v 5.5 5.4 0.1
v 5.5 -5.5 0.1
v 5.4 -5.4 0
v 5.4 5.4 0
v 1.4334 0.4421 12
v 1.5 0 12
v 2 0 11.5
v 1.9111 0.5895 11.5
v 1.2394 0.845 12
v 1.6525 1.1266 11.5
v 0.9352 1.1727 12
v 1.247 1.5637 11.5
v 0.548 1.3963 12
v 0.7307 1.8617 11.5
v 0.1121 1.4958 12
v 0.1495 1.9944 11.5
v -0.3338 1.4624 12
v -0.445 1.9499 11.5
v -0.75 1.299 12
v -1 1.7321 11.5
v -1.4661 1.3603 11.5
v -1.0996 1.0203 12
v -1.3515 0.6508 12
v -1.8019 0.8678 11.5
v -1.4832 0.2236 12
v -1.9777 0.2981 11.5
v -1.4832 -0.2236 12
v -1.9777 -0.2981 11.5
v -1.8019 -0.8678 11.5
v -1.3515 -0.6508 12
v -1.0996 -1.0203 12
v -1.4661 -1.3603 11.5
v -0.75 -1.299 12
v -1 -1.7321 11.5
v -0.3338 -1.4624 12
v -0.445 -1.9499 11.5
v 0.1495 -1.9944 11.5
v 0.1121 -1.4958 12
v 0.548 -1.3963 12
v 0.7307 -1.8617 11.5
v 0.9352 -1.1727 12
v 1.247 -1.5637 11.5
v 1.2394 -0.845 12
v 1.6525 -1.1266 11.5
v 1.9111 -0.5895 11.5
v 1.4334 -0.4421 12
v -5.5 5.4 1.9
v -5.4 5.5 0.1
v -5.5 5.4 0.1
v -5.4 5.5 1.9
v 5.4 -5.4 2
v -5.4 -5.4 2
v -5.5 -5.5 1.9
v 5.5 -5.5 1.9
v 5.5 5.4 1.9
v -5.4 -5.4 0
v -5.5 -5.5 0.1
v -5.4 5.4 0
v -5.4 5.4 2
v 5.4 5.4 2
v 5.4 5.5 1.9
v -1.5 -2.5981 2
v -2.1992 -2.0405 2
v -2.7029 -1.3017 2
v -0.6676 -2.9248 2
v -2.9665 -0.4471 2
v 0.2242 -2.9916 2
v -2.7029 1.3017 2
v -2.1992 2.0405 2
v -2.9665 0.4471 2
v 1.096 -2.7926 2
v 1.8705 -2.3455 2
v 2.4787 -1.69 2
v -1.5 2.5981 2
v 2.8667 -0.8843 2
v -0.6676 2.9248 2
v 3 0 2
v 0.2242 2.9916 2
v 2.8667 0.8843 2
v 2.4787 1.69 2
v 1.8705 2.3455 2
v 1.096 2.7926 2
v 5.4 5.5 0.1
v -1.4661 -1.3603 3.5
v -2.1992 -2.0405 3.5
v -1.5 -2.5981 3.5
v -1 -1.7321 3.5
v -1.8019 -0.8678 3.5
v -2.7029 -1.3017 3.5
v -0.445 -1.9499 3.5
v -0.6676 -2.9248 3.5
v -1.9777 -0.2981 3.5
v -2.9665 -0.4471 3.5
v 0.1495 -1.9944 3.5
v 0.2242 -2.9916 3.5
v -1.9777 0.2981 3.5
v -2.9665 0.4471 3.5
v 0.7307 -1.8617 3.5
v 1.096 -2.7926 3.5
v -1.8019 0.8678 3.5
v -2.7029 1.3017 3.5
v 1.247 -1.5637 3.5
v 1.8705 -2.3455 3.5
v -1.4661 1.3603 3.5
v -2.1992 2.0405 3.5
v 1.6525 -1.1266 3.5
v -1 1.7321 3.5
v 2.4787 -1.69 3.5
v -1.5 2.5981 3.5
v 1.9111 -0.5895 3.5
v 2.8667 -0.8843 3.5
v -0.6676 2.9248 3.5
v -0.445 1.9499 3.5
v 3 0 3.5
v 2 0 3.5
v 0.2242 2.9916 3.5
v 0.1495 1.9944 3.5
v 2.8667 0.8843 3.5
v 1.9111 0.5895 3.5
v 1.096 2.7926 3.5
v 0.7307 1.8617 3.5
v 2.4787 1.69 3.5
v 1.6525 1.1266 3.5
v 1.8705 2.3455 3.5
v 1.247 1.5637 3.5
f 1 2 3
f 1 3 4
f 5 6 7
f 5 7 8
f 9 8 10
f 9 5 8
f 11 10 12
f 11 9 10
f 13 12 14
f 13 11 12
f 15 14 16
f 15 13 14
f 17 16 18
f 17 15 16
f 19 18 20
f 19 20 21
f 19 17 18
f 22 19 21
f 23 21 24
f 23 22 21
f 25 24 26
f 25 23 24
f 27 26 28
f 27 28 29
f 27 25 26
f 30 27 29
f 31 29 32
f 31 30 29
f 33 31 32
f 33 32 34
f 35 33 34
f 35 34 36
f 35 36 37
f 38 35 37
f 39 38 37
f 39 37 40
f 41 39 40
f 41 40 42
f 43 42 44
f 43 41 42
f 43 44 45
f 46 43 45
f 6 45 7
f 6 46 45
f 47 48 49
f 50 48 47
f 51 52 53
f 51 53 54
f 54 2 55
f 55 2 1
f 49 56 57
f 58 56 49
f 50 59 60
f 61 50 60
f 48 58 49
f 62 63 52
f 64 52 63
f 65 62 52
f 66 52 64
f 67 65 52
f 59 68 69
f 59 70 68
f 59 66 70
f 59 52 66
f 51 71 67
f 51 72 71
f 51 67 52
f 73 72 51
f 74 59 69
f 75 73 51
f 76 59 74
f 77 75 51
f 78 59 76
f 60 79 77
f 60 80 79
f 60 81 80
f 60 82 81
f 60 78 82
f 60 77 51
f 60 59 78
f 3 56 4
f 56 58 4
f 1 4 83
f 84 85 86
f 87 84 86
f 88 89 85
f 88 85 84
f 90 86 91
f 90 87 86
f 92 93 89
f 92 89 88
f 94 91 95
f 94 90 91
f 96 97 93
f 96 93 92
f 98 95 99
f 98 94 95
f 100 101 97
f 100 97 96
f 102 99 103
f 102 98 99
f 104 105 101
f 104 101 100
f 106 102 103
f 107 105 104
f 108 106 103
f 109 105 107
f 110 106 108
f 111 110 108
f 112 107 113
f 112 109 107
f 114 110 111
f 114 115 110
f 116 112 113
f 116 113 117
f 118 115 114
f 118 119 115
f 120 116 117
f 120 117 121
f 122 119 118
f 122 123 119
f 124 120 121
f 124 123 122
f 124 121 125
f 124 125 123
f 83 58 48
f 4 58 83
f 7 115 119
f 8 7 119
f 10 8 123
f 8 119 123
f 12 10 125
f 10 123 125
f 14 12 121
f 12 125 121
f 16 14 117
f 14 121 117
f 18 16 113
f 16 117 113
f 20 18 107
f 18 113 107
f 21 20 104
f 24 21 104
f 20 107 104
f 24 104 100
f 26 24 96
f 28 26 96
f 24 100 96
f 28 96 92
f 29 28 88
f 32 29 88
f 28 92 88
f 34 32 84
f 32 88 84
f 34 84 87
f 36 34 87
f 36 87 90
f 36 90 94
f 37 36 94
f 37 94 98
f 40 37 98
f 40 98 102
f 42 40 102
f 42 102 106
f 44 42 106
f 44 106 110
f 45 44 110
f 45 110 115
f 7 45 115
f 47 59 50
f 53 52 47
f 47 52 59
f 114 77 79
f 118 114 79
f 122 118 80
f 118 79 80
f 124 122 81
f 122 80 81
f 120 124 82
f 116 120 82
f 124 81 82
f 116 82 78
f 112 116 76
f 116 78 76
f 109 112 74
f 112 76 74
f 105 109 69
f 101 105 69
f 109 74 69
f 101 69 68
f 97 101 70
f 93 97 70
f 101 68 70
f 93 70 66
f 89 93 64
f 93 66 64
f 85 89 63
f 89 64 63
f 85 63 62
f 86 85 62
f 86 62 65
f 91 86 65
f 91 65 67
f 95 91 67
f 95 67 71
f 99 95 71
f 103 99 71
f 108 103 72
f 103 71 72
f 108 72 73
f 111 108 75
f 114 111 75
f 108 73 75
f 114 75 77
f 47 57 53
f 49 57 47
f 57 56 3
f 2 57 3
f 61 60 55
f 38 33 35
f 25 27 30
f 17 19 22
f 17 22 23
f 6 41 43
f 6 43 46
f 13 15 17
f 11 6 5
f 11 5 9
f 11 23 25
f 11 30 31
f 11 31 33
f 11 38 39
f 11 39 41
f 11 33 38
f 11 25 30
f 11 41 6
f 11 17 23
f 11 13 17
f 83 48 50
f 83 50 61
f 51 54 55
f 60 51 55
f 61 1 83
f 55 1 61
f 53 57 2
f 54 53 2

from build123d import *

# Parameters (mm, degrees)
SKETCH1_W           = 11
SKETCH1_H           = 11
BOSS_EXTRUDE1_DEPTH = 2
SKETCH2_R           = 2
BOSS_EXTRUDE2_DEPTH = 10
CHAMFER1_SIZE       = 0.1
SKETCH3_R           = 3
BOSS_EXTRUDE3_DEPTH = 1.5
CHAMFER2_SIZE       = 0.5


with BuildPart() as part:
    # Sketch1 → Boss-Extrude1 (new body)
    with BuildSketch(Plane.XY):
        Rectangle(SKETCH1_W, SKETCH1_H)
    extrude(amount=BOSS_EXTRUDE1_DEPTH)

    # Sketch2 → Boss-Extrude2 (add)
    with BuildSketch(Plane.XY.offset(2)):
        Circle(SKETCH2_R)
    extrude(amount=BOSS_EXTRUDE2_DEPTH)

    # Chamfer1
    chamfer1_edges = [part.edges().sort_by_distance(p)[0] for p in [
        (-5.5, 0, 2),
        (0, -5.5, 2),
        (5.5, 0, 2),
        (0, -5.5, 0),
        (-5.5, 0, 0),
        (0, 5.5, 0),
        (5.5, 0, 0),
        (0, 5.5, 2),
        (-5.5, 5.5, 1),
        (5.5, 5.5, 1),
    ]]
    chamfer(chamfer1_edges, length=CHAMFER1_SIZE)

    # Sketch3 → Boss-Extrude3 (add)
    with BuildSketch(Plane.XY.offset(2)):
        Circle(SKETCH3_R)
    extrude(amount=BOSS_EXTRUDE3_DEPTH)

    # Chamfer2
    chamfer2_edges = [part.edges().sort_by_distance(p)[0] for p in [
        (-2, 0, 12),
    ]]
    chamfer(chamfer2_edges, length=CHAMFER2_SIZE)


solid = part.part
